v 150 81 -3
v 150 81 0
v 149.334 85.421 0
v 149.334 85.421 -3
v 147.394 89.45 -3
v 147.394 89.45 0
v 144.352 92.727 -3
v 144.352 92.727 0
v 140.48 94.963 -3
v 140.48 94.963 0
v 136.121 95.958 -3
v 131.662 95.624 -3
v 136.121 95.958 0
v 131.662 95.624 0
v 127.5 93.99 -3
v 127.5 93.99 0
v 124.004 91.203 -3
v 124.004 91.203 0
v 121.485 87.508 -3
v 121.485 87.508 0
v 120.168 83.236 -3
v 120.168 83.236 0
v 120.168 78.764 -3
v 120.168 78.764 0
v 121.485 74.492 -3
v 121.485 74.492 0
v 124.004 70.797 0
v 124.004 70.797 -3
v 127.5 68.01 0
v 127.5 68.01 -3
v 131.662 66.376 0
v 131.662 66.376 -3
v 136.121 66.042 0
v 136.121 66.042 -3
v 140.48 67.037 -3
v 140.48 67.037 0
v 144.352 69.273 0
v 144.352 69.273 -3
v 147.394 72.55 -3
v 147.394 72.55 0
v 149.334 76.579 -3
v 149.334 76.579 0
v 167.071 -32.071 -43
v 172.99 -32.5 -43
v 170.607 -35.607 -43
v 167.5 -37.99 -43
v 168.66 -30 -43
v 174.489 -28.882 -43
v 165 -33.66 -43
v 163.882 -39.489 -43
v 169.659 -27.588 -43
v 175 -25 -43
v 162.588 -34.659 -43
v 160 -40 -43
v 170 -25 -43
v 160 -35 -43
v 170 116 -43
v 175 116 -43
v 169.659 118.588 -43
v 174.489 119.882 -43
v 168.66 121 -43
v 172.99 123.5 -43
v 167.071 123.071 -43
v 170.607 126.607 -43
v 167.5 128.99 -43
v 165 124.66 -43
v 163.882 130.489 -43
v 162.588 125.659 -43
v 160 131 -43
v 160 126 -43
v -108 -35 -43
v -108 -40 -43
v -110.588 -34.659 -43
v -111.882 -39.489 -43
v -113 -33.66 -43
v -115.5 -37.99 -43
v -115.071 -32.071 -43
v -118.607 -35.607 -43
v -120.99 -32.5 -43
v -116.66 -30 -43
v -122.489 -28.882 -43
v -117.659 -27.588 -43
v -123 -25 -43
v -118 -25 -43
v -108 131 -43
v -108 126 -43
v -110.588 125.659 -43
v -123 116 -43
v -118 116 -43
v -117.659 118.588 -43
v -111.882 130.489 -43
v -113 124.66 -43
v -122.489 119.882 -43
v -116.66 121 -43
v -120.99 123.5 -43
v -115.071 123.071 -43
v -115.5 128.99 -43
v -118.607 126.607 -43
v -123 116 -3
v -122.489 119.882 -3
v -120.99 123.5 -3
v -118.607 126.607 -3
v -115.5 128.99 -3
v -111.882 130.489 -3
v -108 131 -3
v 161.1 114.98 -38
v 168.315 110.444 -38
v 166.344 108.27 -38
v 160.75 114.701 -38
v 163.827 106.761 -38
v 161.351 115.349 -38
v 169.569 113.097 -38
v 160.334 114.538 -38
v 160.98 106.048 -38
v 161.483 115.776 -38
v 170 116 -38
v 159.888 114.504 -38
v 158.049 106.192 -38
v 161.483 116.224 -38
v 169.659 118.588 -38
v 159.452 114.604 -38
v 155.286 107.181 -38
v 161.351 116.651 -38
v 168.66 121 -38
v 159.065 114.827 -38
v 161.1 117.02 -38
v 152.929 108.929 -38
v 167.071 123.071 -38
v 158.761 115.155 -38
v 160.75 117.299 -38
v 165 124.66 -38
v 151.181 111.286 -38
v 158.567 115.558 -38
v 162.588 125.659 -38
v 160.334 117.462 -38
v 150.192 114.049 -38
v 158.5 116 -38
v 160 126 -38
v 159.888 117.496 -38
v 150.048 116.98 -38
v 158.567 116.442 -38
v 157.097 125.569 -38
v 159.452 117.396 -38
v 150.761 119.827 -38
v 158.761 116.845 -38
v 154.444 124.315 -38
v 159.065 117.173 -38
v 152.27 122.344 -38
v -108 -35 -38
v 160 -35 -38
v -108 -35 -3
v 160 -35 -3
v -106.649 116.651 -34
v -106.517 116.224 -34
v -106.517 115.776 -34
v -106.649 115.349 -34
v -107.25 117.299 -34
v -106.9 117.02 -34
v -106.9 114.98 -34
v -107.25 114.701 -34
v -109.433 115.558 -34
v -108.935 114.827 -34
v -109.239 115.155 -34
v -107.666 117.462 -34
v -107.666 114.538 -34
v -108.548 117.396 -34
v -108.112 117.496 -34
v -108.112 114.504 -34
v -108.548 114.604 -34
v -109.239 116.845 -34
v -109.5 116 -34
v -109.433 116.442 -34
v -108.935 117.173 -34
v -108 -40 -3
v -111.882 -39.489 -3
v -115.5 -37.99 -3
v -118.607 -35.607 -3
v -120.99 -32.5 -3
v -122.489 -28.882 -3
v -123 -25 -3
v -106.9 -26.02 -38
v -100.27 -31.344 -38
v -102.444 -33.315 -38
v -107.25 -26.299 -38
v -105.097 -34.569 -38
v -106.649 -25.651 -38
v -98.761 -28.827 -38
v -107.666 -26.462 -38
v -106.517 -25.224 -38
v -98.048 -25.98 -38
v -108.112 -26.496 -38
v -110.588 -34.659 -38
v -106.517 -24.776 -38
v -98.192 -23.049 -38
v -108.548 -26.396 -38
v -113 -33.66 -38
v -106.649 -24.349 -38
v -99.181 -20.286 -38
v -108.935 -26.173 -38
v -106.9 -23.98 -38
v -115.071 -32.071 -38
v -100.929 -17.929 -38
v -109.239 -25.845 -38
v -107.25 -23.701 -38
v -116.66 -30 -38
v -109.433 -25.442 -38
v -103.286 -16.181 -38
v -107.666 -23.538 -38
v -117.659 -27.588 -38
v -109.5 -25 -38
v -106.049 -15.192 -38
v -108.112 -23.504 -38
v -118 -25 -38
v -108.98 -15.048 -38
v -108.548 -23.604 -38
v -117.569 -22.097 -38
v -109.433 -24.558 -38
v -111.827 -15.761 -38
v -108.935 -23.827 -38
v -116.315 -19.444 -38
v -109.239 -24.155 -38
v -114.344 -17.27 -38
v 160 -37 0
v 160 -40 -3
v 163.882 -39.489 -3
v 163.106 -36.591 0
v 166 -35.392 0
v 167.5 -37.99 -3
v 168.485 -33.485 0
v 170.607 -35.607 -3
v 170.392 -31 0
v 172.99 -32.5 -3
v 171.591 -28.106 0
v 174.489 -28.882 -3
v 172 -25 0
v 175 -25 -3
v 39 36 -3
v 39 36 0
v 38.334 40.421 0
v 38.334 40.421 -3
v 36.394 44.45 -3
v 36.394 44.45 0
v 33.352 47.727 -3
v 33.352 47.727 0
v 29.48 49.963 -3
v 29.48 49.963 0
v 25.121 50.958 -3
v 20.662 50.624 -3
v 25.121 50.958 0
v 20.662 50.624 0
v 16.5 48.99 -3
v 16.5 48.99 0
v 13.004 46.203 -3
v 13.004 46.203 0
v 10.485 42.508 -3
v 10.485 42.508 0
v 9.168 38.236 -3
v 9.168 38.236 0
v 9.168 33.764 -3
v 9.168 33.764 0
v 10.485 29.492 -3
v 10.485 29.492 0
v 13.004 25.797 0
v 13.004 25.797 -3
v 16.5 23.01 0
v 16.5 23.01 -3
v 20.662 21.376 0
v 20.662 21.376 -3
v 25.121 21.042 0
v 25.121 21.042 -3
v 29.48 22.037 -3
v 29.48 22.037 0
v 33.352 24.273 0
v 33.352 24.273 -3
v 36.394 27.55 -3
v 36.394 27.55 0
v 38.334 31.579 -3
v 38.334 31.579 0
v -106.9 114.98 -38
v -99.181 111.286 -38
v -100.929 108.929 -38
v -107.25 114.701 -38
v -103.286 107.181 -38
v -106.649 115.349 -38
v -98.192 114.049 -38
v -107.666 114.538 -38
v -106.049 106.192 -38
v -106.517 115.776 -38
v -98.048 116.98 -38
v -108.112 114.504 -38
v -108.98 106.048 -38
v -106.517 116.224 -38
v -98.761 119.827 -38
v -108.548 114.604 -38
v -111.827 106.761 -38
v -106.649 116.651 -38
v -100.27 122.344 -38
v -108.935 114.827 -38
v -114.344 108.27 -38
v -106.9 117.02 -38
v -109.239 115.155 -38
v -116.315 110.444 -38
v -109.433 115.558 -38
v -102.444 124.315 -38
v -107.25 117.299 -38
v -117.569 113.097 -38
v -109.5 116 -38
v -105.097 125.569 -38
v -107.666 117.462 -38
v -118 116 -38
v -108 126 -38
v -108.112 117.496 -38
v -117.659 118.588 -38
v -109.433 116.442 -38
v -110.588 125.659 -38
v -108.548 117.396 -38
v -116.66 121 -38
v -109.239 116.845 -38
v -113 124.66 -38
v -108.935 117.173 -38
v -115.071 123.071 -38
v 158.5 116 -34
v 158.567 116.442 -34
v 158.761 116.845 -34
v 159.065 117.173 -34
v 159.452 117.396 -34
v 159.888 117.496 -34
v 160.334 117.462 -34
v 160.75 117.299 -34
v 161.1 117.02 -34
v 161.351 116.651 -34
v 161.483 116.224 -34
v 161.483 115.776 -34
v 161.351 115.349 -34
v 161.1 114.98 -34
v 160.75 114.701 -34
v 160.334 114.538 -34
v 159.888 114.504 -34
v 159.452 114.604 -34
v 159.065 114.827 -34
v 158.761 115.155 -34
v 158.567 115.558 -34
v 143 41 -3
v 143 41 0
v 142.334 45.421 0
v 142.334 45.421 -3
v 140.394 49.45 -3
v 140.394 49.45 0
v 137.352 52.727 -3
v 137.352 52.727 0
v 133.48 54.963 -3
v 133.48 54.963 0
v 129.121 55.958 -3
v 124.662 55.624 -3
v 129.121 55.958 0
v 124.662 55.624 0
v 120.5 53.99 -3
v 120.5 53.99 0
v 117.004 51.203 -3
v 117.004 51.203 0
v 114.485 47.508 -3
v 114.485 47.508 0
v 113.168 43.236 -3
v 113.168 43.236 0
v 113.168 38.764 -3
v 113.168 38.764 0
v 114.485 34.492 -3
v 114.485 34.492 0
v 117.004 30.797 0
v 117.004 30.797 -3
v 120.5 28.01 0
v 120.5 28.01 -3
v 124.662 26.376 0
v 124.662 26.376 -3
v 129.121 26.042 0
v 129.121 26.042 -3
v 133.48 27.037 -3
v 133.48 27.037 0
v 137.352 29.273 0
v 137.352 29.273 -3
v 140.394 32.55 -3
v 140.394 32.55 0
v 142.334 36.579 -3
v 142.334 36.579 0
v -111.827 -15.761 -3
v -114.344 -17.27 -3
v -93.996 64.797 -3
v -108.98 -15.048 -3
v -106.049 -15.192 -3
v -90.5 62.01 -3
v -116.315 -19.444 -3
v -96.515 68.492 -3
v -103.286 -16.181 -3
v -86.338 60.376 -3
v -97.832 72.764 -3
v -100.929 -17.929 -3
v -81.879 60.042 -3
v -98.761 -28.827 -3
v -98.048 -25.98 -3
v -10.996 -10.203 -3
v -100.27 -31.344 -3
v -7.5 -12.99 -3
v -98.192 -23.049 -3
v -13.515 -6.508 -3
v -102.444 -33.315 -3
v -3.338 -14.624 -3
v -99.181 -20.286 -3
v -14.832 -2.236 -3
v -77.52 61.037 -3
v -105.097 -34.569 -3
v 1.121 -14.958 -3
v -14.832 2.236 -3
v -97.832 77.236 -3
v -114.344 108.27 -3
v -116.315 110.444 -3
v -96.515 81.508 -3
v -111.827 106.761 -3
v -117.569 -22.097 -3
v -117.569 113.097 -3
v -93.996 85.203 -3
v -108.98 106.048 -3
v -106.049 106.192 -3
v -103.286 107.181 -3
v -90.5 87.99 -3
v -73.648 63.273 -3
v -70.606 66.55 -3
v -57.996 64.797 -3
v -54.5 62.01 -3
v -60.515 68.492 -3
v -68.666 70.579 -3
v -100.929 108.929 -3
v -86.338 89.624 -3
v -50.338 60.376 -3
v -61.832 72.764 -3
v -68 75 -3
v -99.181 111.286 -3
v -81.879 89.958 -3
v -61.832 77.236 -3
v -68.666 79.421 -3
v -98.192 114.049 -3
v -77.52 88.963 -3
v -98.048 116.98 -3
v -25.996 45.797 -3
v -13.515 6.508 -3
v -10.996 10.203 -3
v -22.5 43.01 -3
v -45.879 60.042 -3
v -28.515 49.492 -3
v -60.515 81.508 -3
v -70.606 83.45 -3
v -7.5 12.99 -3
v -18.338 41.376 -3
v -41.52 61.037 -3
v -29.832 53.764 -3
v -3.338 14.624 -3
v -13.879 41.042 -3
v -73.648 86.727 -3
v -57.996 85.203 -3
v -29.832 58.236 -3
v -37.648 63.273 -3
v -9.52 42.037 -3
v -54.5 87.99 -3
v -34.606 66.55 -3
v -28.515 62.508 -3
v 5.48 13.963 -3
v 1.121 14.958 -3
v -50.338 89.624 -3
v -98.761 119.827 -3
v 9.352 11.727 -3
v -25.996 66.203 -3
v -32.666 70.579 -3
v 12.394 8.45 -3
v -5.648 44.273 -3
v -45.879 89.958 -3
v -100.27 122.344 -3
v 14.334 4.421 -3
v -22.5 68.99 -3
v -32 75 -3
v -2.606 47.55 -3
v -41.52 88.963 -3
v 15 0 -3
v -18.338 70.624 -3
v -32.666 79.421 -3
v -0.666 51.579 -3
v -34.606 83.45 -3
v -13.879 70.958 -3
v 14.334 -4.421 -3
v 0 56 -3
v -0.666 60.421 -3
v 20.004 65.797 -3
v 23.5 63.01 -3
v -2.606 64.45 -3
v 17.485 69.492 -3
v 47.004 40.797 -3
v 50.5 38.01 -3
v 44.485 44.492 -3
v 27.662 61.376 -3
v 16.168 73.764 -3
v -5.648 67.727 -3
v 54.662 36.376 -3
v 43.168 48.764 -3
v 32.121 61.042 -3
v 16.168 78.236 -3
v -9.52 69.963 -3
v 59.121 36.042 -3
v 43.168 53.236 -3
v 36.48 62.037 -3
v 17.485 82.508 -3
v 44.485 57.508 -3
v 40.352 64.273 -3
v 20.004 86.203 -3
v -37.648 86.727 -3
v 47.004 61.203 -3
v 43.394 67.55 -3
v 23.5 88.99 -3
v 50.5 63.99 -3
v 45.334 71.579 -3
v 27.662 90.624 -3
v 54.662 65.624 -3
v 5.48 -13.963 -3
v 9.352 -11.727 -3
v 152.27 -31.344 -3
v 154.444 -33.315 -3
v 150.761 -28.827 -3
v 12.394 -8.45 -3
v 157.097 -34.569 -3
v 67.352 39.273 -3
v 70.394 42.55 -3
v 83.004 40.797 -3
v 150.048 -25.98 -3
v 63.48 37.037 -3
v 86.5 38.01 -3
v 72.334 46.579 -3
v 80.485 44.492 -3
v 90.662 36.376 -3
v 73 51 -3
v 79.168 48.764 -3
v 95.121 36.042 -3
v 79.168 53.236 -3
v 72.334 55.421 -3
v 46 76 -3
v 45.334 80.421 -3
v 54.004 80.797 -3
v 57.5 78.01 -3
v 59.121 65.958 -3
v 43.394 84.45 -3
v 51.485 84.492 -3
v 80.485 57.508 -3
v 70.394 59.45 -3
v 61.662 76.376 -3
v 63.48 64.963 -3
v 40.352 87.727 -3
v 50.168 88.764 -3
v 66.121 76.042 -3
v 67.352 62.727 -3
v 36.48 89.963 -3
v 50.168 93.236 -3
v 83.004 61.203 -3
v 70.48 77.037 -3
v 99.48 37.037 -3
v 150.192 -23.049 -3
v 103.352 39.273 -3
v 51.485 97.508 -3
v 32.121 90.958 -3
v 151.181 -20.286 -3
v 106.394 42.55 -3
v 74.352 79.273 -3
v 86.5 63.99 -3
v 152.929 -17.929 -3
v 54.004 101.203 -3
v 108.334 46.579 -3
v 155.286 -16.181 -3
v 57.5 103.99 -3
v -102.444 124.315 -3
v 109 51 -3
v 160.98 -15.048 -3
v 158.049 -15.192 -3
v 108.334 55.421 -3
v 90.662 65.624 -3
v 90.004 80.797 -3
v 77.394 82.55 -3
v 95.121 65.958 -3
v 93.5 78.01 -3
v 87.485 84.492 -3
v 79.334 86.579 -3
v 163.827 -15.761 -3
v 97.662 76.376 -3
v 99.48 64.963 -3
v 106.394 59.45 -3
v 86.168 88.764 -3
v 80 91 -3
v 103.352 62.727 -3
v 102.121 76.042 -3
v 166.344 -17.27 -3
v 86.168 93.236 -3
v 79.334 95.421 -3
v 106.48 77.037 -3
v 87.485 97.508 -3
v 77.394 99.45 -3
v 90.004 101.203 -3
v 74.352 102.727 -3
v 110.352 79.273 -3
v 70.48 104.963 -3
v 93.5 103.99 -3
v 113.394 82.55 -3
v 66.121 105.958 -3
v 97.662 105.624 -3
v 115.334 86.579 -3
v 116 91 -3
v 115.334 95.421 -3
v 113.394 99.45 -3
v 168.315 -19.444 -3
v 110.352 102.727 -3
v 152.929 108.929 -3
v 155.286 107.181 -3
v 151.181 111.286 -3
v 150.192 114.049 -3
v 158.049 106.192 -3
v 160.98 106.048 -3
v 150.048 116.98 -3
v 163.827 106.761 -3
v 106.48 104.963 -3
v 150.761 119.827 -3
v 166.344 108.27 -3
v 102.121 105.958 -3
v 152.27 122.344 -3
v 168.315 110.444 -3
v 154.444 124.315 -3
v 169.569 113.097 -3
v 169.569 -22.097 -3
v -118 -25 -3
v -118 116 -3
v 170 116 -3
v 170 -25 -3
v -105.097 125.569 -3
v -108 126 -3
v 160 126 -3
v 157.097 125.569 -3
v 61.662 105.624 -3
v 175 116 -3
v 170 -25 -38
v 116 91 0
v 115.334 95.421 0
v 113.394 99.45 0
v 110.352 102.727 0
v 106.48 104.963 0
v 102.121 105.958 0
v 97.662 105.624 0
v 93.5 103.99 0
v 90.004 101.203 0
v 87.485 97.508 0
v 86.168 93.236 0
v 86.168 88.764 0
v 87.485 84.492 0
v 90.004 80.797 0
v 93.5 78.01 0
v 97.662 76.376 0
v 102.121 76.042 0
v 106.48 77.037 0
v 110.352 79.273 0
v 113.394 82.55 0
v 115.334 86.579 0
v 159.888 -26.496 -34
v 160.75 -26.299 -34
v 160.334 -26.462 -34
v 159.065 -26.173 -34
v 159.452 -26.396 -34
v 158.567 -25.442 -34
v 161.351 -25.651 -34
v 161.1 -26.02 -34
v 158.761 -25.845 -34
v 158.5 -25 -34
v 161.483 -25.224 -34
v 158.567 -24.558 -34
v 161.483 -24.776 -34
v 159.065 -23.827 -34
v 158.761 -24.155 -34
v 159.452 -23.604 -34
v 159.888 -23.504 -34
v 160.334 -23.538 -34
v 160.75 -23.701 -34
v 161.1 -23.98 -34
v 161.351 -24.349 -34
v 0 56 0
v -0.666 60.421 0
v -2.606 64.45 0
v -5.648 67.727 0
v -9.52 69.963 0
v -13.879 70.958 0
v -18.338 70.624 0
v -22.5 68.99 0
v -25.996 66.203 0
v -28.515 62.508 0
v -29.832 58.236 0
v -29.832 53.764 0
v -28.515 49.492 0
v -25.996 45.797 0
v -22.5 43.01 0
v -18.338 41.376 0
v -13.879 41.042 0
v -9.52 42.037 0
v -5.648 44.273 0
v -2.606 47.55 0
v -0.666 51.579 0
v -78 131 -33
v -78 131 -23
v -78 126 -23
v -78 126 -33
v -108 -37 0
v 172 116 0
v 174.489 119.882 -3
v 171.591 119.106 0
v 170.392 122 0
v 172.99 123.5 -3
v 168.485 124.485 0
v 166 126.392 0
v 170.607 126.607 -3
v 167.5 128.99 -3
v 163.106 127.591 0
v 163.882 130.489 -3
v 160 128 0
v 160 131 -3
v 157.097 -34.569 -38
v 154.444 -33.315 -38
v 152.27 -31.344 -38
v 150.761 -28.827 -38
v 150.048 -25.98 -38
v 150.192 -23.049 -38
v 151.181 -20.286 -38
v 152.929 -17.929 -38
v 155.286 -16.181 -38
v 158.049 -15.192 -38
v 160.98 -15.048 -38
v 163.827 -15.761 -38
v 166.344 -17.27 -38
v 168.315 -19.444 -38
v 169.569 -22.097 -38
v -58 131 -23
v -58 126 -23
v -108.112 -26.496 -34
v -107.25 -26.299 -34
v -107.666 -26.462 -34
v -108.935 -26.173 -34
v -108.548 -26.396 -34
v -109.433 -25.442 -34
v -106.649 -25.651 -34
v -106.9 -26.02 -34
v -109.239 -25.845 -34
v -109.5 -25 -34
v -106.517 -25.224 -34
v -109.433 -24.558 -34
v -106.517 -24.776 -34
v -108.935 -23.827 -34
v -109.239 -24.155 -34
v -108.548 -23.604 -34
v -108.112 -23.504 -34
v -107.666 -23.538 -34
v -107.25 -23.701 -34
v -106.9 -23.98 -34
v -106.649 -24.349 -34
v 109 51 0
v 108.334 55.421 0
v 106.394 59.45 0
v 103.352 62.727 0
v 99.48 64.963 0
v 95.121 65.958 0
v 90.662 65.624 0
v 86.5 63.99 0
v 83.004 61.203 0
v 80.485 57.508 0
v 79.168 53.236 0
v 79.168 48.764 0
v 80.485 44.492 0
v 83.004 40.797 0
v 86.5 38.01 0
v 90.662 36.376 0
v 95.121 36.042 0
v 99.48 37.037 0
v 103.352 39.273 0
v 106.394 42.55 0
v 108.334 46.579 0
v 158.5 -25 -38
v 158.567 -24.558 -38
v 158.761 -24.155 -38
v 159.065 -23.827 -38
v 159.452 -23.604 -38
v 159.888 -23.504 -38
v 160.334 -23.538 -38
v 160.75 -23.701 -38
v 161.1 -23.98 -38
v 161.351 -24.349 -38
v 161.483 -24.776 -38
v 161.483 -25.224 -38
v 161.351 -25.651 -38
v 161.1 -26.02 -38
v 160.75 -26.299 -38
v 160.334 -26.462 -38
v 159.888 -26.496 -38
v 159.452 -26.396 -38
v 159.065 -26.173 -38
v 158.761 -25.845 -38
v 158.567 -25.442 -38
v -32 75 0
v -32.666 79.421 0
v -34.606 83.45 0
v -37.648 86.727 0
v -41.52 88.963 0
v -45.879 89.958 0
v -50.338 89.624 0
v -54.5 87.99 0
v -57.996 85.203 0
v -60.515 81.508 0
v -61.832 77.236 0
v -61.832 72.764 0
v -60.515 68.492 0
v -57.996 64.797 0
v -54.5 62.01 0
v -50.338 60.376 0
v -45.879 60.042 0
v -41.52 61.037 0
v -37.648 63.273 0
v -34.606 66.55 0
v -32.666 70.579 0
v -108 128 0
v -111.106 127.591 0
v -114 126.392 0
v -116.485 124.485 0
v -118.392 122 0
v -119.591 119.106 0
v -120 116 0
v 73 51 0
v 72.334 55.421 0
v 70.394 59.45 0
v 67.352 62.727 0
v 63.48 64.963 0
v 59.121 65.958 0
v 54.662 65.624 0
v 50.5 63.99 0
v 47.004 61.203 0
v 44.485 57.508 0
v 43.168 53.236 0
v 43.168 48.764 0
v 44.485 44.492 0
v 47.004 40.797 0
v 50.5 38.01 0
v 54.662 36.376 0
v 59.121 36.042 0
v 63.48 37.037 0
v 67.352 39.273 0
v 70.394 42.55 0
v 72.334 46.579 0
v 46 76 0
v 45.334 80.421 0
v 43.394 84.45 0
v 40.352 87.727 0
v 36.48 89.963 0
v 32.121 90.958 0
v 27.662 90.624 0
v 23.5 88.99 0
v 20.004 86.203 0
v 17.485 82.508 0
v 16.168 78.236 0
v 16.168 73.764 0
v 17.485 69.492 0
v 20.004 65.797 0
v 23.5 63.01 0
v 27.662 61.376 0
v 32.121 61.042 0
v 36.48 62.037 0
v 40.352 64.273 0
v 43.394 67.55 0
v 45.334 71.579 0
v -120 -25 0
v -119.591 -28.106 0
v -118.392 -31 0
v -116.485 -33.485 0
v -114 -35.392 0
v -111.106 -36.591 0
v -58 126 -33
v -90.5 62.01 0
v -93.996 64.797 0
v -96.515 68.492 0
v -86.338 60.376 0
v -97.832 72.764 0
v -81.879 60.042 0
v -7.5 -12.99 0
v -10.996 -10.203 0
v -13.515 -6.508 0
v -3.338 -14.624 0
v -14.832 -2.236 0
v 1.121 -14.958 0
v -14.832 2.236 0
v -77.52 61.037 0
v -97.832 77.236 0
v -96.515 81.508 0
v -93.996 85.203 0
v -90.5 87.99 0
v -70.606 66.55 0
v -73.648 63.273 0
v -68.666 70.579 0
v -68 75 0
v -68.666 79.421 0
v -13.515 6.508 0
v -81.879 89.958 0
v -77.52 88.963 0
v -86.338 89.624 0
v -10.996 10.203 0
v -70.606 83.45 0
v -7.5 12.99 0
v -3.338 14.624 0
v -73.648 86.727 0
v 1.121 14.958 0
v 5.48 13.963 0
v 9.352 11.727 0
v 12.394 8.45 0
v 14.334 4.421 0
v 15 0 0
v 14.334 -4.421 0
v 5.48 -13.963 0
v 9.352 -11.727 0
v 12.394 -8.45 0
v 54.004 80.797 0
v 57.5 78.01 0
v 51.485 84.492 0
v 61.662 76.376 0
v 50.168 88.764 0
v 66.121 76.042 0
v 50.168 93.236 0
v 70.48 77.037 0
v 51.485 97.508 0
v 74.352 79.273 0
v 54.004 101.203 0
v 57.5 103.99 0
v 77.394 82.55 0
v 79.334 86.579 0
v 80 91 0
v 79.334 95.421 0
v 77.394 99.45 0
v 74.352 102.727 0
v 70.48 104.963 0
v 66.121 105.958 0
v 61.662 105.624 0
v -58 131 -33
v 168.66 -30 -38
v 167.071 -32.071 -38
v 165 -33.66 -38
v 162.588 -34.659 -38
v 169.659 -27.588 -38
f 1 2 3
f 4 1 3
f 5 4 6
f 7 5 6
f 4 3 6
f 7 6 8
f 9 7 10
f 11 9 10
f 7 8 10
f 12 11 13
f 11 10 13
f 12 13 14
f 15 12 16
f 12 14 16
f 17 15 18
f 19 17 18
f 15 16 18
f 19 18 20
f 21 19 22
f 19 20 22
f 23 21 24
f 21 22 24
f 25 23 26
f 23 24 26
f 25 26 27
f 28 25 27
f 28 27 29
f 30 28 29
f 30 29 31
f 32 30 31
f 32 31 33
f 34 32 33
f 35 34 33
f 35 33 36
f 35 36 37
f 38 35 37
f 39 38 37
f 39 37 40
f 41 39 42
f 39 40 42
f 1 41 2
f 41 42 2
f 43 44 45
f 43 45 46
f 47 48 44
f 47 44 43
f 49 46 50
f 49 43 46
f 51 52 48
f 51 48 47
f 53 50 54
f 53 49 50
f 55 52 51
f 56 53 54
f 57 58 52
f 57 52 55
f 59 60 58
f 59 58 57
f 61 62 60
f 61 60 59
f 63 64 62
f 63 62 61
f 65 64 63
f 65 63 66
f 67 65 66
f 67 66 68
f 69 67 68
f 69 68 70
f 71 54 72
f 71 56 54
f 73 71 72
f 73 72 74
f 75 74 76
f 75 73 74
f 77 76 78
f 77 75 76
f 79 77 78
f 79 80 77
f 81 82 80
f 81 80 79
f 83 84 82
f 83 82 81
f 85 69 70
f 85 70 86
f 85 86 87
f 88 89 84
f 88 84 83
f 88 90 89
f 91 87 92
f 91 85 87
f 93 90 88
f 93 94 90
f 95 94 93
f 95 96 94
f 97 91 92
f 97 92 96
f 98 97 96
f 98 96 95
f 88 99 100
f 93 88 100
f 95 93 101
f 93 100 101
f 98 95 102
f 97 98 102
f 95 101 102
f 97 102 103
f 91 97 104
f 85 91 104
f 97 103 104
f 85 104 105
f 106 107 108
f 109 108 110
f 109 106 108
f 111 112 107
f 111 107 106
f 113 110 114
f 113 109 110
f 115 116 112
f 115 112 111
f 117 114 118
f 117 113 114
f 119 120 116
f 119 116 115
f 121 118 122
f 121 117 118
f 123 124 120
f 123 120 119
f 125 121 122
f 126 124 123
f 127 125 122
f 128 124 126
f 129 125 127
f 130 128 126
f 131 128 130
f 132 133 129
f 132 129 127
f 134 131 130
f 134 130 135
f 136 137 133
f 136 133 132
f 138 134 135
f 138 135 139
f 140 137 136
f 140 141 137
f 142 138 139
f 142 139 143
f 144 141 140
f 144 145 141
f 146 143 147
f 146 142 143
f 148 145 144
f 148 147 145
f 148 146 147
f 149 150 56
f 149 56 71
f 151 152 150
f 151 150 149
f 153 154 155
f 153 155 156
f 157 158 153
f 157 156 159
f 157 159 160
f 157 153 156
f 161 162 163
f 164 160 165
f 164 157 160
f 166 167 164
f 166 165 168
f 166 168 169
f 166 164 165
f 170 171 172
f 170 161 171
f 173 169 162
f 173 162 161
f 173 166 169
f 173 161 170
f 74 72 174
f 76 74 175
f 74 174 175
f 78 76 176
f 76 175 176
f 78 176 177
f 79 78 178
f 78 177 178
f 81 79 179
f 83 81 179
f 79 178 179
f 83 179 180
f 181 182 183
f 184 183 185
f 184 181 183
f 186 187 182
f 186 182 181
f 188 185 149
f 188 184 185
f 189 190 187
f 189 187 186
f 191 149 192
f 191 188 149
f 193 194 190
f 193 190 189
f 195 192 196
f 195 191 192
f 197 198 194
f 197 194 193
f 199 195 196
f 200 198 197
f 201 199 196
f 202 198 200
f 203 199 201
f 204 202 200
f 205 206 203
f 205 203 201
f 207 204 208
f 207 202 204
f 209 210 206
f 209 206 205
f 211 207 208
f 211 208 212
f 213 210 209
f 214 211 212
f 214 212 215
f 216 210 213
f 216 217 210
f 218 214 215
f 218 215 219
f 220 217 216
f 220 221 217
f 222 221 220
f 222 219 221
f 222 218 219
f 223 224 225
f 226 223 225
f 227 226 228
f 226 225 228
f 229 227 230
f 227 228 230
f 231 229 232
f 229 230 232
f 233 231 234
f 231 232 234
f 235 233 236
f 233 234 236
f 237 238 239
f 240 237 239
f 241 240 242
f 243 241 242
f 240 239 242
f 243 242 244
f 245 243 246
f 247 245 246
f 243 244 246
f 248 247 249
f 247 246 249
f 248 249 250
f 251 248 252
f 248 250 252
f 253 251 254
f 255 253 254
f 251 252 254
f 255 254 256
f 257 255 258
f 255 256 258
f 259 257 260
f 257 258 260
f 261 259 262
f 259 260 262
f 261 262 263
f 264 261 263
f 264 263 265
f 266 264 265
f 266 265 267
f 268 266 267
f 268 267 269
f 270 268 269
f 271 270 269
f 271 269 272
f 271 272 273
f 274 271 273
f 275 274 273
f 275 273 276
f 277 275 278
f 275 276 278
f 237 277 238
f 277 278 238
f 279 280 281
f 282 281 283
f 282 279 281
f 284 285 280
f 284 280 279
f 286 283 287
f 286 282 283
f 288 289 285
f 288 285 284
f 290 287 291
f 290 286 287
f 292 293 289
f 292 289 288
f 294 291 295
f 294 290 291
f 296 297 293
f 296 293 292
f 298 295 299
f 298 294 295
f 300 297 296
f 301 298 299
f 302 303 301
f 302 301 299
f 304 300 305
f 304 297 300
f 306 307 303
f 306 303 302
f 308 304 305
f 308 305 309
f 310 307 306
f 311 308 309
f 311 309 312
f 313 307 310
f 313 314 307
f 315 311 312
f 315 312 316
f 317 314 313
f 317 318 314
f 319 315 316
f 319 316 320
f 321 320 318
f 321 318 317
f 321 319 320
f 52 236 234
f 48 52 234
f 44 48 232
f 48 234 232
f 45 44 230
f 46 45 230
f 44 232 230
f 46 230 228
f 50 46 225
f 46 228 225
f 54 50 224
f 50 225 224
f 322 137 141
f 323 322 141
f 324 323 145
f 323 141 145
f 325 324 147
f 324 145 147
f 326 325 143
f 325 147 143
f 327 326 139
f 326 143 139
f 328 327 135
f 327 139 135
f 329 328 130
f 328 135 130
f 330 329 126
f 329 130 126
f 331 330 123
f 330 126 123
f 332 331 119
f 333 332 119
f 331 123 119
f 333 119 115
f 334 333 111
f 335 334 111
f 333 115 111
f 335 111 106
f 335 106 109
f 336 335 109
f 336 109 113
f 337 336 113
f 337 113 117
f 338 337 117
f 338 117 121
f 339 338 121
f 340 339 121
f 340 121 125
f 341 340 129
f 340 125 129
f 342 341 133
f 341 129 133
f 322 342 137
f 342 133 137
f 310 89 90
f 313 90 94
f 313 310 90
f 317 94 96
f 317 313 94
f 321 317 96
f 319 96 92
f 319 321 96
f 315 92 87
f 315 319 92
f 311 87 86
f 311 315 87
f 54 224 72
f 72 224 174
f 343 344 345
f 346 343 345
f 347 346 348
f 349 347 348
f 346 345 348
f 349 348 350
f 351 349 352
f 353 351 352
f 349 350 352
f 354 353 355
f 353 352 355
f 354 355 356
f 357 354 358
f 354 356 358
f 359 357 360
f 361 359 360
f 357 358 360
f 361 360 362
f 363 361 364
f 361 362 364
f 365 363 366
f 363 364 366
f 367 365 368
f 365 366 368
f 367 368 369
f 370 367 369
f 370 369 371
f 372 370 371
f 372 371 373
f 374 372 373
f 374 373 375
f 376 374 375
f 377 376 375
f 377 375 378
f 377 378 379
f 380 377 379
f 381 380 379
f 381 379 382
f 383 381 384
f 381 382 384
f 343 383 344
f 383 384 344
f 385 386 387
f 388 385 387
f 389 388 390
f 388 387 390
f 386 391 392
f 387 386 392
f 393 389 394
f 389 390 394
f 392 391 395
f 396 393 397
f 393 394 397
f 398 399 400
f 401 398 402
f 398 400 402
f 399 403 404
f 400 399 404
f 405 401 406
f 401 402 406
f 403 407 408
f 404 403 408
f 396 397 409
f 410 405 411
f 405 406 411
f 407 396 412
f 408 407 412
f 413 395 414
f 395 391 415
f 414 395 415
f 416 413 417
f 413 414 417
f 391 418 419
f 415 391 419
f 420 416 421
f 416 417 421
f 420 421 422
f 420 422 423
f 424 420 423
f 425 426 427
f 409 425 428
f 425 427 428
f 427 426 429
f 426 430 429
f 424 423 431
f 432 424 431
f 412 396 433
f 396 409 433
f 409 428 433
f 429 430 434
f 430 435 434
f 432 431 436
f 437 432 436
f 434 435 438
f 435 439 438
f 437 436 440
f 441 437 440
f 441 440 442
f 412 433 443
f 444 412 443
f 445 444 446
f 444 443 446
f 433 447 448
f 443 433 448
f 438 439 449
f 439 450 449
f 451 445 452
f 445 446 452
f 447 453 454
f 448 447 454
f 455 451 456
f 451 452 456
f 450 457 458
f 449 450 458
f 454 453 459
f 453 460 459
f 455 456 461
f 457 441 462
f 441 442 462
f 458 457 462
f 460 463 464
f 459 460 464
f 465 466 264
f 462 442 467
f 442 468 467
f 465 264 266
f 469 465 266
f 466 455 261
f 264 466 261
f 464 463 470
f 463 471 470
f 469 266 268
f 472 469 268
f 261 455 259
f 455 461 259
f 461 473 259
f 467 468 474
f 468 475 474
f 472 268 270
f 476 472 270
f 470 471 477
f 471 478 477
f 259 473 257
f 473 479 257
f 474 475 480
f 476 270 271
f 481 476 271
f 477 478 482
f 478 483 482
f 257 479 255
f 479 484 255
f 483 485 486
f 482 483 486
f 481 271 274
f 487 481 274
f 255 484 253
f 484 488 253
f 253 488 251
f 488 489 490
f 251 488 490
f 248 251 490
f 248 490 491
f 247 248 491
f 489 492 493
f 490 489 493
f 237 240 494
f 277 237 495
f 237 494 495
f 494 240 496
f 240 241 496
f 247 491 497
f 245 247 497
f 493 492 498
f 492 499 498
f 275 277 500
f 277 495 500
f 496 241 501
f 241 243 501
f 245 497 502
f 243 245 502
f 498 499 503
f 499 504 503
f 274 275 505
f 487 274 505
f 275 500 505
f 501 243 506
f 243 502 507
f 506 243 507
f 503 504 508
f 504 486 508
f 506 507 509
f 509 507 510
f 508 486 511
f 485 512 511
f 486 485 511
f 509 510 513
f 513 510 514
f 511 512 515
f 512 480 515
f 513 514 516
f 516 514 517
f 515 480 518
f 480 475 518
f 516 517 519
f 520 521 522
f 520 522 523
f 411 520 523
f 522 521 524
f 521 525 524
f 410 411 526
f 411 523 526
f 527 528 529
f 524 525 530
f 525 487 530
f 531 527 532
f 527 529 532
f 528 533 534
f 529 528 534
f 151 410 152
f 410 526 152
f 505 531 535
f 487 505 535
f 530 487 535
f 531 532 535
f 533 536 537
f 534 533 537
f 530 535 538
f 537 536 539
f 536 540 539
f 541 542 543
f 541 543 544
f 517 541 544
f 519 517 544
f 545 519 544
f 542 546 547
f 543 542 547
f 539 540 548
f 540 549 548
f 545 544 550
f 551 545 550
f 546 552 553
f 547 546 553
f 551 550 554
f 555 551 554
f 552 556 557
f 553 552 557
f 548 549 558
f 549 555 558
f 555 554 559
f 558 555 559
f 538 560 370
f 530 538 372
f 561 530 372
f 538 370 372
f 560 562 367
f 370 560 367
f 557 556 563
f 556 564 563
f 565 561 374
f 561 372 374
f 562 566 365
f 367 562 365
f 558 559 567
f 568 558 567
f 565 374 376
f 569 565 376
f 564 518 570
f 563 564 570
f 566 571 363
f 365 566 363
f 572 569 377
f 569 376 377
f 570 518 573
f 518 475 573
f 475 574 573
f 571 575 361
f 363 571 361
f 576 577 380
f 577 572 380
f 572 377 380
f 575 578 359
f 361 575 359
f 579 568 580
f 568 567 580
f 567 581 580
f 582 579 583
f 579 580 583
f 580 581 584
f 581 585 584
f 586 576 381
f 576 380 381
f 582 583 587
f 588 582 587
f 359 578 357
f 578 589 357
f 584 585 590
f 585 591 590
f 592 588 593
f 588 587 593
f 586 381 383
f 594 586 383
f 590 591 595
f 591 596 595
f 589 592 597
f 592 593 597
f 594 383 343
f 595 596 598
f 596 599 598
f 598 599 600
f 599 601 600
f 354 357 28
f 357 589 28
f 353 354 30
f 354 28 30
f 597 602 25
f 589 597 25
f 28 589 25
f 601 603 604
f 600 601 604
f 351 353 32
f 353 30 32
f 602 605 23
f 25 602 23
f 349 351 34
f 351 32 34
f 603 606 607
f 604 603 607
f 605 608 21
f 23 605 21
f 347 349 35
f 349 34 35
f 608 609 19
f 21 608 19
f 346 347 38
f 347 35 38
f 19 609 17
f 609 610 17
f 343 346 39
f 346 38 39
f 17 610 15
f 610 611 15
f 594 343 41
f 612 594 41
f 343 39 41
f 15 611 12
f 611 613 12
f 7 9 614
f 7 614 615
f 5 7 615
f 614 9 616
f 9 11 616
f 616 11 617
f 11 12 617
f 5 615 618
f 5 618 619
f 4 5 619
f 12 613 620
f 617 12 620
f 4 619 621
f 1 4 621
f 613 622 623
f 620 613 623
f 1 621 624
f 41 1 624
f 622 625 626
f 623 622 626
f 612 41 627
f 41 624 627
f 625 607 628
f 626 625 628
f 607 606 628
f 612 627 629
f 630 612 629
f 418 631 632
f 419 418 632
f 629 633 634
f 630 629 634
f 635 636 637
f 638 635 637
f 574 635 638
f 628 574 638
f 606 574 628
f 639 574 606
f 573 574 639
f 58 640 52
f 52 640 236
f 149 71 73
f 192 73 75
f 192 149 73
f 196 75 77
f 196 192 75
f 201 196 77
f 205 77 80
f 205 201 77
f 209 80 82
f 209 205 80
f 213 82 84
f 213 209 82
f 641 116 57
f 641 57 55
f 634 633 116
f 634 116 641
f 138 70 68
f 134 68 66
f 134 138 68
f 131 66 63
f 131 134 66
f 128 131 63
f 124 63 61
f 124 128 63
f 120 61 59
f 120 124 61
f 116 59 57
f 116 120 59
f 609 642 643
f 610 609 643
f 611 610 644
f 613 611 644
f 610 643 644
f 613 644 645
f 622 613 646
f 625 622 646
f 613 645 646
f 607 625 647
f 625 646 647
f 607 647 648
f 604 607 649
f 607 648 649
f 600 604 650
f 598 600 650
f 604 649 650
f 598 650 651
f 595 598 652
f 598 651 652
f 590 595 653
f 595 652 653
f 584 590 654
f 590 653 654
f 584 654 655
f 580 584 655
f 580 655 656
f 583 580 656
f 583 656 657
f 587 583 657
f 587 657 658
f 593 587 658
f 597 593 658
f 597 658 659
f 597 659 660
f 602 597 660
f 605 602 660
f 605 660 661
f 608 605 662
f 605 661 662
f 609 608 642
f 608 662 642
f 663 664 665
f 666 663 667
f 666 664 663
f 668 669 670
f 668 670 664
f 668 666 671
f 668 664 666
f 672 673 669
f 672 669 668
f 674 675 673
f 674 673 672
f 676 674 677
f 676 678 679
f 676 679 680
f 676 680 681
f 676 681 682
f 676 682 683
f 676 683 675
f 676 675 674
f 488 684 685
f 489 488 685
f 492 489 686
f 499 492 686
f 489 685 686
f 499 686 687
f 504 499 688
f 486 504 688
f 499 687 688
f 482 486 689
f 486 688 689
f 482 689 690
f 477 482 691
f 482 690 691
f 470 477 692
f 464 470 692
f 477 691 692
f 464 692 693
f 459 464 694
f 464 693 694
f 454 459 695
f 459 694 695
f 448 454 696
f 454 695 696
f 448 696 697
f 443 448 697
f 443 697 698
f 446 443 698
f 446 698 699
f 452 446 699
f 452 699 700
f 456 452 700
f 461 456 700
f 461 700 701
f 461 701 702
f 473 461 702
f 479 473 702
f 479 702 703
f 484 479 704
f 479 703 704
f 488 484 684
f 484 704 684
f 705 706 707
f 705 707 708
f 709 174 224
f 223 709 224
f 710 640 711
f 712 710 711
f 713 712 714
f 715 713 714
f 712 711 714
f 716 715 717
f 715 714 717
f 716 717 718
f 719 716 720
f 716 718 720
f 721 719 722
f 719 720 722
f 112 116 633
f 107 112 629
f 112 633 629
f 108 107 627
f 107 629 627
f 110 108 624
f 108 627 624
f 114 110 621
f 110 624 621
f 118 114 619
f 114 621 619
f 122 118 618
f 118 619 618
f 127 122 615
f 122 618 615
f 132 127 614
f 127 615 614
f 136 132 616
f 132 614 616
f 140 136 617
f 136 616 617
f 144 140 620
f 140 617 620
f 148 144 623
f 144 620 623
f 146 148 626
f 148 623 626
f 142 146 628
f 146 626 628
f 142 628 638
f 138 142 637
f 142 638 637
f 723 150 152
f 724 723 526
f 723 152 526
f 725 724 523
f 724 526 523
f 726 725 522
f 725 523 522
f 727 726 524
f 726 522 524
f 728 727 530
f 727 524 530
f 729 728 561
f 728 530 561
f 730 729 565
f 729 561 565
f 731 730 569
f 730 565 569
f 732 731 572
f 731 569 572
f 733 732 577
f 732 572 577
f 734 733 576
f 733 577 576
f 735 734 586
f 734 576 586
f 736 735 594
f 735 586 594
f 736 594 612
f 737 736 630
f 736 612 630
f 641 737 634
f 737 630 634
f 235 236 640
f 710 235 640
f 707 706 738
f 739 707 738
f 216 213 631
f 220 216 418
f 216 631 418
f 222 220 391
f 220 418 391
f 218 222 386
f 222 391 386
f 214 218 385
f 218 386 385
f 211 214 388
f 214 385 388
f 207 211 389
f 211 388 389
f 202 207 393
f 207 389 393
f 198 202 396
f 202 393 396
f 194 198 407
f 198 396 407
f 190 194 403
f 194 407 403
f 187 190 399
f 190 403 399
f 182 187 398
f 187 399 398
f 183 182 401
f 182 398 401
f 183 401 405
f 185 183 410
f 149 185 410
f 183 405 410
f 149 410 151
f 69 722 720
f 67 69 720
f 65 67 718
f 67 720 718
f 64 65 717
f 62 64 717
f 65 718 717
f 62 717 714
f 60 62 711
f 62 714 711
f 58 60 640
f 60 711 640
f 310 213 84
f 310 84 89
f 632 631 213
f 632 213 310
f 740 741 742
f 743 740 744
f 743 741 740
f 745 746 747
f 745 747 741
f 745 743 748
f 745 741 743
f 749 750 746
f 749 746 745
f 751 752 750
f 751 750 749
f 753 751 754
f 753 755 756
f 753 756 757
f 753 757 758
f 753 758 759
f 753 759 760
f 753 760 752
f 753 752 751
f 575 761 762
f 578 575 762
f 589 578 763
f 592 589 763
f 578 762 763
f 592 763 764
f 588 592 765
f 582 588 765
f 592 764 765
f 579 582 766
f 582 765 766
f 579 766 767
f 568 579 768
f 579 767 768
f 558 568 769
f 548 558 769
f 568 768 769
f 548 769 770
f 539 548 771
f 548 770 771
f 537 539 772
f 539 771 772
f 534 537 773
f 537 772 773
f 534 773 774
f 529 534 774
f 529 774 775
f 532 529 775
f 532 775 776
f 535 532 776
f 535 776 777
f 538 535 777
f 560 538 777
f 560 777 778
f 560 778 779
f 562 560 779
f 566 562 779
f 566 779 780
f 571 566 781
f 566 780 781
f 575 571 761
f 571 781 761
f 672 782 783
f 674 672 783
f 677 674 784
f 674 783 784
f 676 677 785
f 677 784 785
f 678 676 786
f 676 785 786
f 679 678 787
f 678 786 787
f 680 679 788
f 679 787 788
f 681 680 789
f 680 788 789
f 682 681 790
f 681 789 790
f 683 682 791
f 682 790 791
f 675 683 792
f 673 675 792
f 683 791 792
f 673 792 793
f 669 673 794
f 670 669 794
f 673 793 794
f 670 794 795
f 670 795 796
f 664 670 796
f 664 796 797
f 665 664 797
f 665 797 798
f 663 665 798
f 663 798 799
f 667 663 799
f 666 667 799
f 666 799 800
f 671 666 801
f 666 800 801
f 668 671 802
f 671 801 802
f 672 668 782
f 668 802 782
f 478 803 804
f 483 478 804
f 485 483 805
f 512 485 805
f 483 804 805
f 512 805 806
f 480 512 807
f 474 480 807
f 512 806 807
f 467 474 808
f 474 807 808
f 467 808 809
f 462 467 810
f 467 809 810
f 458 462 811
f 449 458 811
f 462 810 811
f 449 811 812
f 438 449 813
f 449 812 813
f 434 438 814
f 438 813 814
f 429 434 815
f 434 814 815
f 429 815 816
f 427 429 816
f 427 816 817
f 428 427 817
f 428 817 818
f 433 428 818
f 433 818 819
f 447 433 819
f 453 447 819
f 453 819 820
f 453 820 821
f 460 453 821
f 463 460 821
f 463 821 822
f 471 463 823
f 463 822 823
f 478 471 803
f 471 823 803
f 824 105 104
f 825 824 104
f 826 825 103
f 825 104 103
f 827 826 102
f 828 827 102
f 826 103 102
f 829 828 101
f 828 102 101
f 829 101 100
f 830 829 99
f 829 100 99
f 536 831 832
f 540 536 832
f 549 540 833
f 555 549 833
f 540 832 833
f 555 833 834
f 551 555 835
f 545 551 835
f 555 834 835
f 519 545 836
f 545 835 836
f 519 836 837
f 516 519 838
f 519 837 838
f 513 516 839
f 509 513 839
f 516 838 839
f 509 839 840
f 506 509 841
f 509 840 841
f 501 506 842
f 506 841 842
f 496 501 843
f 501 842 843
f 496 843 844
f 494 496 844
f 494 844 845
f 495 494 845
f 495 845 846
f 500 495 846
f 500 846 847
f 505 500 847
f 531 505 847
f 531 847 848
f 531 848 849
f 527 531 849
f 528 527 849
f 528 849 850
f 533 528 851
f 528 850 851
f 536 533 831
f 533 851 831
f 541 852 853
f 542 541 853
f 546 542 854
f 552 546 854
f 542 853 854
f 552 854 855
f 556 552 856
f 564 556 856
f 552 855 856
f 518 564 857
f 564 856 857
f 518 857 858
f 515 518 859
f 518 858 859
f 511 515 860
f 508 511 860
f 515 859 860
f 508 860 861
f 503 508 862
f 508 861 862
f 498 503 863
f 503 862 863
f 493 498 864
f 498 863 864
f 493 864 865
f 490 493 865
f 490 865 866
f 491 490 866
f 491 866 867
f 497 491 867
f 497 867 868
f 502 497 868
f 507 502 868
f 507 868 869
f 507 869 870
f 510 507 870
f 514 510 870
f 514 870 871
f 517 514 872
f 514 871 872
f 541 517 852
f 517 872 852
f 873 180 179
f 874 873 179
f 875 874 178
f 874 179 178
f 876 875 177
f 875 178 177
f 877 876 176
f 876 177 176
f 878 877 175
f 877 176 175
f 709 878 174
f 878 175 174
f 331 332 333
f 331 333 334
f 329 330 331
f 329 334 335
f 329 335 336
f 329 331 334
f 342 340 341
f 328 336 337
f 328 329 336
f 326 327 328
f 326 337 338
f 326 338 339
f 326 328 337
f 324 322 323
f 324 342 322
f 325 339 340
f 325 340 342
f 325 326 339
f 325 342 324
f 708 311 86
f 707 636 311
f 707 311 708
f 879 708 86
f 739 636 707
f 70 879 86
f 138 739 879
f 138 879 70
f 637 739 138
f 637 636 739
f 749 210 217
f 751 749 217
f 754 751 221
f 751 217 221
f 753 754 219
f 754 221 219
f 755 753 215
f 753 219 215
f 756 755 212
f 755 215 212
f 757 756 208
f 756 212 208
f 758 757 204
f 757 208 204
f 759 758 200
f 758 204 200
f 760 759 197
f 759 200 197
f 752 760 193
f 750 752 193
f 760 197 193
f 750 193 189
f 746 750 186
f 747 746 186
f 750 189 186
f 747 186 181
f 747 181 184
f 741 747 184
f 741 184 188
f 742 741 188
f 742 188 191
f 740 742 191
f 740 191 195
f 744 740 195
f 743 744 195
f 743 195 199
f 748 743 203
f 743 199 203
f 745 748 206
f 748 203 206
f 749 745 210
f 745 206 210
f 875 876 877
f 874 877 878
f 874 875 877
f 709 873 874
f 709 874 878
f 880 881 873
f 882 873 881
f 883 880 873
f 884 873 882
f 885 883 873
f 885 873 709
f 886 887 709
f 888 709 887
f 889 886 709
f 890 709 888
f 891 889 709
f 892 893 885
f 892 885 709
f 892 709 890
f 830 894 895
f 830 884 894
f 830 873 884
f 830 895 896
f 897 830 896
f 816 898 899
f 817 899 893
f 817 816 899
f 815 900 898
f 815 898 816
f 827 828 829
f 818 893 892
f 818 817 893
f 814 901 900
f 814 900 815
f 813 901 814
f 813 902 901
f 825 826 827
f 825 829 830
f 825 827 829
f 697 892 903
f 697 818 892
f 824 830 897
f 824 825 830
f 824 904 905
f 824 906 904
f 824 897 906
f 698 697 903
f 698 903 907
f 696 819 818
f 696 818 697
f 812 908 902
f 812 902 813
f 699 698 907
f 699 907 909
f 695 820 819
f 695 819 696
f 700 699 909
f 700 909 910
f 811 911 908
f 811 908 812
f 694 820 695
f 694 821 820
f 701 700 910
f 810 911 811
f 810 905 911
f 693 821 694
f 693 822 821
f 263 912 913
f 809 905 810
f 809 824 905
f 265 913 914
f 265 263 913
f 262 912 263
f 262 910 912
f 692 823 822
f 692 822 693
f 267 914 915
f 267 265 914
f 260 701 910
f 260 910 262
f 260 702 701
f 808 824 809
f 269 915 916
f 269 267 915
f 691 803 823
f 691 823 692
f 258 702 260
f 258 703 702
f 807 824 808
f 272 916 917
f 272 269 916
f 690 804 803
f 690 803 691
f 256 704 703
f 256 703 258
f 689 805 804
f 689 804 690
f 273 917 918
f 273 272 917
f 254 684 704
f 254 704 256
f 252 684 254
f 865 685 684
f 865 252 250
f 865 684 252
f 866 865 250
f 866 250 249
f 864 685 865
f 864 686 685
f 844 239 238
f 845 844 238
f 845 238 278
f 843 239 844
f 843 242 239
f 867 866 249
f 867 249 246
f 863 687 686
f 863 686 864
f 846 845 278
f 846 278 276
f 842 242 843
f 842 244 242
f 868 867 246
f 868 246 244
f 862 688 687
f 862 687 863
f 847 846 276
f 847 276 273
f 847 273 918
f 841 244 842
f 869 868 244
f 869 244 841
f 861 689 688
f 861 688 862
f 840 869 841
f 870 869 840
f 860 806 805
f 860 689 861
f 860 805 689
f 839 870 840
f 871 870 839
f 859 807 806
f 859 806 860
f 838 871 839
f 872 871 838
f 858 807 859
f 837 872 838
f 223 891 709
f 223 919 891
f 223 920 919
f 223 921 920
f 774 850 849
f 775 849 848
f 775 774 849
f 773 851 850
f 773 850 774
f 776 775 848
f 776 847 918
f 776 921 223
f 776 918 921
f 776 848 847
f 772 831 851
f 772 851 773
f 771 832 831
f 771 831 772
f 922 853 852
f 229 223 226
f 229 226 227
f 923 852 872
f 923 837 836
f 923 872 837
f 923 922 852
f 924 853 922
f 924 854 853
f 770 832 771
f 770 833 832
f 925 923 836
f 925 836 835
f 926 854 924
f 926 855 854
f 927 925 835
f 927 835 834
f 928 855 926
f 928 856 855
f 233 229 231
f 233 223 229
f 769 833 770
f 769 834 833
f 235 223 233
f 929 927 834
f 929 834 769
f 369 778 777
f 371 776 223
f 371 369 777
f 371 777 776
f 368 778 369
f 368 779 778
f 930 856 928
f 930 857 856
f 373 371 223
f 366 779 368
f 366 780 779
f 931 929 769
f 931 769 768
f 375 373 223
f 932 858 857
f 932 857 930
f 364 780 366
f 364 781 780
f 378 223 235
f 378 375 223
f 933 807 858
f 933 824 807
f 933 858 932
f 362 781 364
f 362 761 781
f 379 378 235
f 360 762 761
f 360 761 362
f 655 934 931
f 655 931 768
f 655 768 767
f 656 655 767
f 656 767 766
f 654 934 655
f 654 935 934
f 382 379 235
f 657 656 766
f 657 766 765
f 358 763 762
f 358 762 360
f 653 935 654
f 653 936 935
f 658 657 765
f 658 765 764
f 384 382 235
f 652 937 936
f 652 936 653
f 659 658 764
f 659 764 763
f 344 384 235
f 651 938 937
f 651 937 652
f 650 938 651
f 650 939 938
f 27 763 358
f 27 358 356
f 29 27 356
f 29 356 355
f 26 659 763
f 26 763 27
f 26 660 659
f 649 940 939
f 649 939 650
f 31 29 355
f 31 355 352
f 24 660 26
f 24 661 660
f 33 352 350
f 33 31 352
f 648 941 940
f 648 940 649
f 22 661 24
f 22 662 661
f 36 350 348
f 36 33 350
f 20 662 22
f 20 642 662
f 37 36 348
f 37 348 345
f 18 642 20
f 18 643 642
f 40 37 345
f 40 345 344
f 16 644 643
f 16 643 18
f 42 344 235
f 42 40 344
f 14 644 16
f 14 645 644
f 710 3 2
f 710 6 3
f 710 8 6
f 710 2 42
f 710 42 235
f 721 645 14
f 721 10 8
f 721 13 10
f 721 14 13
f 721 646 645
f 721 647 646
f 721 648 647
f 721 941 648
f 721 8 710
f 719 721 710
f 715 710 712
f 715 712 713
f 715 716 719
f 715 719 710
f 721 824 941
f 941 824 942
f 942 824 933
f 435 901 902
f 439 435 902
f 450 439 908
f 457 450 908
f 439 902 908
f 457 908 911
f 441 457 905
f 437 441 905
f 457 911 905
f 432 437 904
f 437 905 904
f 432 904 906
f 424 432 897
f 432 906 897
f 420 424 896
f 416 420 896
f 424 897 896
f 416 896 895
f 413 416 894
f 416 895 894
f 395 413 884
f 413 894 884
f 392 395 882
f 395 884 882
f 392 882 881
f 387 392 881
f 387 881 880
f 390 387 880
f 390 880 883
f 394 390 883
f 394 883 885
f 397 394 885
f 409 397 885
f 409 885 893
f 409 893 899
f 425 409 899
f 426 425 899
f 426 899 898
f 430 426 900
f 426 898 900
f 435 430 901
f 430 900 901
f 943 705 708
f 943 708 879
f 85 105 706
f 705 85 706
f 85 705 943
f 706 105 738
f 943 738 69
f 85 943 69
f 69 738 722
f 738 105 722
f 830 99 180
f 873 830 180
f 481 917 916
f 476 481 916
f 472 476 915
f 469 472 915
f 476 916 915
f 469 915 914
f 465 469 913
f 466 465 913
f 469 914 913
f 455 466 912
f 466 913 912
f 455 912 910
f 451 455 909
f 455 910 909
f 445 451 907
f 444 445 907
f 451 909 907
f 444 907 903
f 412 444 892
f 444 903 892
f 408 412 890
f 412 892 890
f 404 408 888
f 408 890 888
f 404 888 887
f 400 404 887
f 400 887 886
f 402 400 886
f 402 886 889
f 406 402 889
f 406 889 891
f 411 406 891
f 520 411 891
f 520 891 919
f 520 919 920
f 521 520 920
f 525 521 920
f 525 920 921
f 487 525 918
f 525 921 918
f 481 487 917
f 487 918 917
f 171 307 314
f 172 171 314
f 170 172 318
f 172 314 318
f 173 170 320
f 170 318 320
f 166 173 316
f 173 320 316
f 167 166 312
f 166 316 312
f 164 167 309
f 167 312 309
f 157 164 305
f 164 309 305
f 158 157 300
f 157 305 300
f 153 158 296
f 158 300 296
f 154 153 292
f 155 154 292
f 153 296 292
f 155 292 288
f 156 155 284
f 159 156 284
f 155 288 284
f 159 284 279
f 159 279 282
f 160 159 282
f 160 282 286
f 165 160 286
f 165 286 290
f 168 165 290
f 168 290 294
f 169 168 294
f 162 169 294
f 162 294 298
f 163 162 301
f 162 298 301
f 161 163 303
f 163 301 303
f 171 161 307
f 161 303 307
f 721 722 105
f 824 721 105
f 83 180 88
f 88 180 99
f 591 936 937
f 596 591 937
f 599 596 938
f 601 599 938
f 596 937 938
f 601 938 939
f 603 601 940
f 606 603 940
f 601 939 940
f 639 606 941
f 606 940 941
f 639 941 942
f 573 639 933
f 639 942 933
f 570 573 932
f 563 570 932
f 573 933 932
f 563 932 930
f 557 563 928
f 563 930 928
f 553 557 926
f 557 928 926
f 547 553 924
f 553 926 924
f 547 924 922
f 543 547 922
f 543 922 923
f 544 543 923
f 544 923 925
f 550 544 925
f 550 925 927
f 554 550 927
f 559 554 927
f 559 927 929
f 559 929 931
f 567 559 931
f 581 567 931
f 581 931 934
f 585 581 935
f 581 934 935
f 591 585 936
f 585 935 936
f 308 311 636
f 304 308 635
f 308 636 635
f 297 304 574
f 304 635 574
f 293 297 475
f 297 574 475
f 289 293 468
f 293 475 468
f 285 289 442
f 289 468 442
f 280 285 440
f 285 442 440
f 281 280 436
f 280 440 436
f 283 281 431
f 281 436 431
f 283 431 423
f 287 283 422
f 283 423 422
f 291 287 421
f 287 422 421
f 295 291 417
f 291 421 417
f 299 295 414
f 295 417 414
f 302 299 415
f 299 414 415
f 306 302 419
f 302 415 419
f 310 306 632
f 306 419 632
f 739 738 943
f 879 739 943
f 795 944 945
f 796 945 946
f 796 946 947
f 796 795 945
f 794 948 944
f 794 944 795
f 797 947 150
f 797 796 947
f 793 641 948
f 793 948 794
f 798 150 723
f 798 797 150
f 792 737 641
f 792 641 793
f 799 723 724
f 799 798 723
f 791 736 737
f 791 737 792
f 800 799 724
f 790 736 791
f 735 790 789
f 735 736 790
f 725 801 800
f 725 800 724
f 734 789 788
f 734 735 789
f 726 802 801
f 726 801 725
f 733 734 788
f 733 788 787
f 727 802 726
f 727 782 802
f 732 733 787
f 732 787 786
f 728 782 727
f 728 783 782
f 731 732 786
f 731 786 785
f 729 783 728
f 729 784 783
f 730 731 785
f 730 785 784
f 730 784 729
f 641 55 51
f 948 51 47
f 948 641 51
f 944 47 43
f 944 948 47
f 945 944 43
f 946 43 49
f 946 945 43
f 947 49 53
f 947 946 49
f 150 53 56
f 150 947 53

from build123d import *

# Parameters (mm, degrees)
SKETCH1_R           = 15
BOSS_EXTRUDE1_DEPTH = 3
BOSS_EXTRUDE2_DEPTH = 40
CHAMFER1_SIZE       = 3
SKETCH4_R           = 10
BOSS_EXTRUDE3_DEPTH = 35
SKETCH6_W           = 20
SKETCH6_H           = 10
CUT_EXTRUDE1_DEPTH  = 5
SKETCH8_R           = 1.5
CUT_EXTRUDE3_DEPTH  = 4


with BuildPart() as part:
    # Sketch1 → Boss-Extrude1 (new body)
    with BuildSketch(Plane.XY):
        with BuildLine():
            Line((-123, 116), (-123, -25))
            ThreePointArc((-123, -25), (-118.606601718, -35.606601718), (-108, -40))
            Line((-108, -40), (160, -40))
            ThreePointArc((160, -40), (170.606601718, -35.606601718), (175, -25))
            Line((175, -25), (175, 116))
            ThreePointArc((175, 116), (170.606601718, 126.606601718), (160, 131))
            Line((160, 131), (-108, 131))
            ThreePointArc((-108, 131), (-118.606601718, 126.606601718), (-123, 116))
        make_face()
        Circle(SKETCH1_R, mode=Mode.SUBTRACT)
        with Locations((-47, 75)):
            Circle(SKETCH1_R, mode=Mode.SUBTRACT)
        with Locations((-15, 56)):
            Circle(SKETCH1_R, mode=Mode.SUBTRACT)
        with Locations((-83, 75)):
            Circle(SKETCH1_R, mode=Mode.SUBTRACT)
        with Locations((31, 76)):
            Circle(SKETCH1_R, mode=Mode.SUBTRACT)
        with Locations((65, 91)):
            Circle(SKETCH1_R, mode=Mode.SUBTRACT)
        with Locations((101, 91)):
            Circle(SKETCH1_R, mode=Mode.SUBTRACT)
        with Locations((24, 36)):
            Circle(SKETCH1_R, mode=Mode.SUBTRACT)
        with Locations((58, 51)):
            Circle(SKETCH1_R, mode=Mode.SUBTRACT)
        with Locations((94, 51)):
            Circle(SKETCH1_R, mode=Mode.SUBTRACT)
        with Locations((135, 81)):
            Circle(SKETCH1_R, mode=Mode.SUBTRACT)
        with Locations((128, 41)):
            Circle(SKETCH1_R, mode=Mode.SUBTRACT)
    extrude(amount=-BOSS_EXTRUDE1_DEPTH)

    # Sketch2 → Boss-Extrude2 (add)
    with BuildSketch(Plane(origin=(0, 0, -3), x_dir=(-1, 0, 0), z_dir=(0, 0, -1))):
        with BuildLine():
            Line((123, -25), (123, 116))
            ThreePointArc((123, 116), (118.606601718, 126.606601718), (108, 131))
            Line((108, 131), (-160, 131))
            ThreePointArc((-160, 131), (-170.606601718, 126.606601718), (-175, 116))
            Line((-175, 116), (-175, -25))
            ThreePointArc((-175, -25), (-170.606601718, -35.606601718), (-160, -40))
            Line((-160, -40), (108, -40))
            ThreePointArc((108, -40), (118.606601718, -35.606601718), (123, -25))
        make_face()
        with BuildLine():
            Line((118, -25), (118, 116))
            ThreePointArc((118, 116), (115.071067812, 123.071067812), (108, 126))
            Line((108, 126), (-160, 126))
            ThreePointArc((-160, 126), (-167.071067812, 123.071067812), (-170, 116))
            Line((-170, 116), (-170, -25))
            ThreePointArc((-170, -25), (-167.071067812, -32.071067812), (-160, -35))
            Line((-160, -35), (108, -35))
            ThreePointArc((108, -35), (115.071067812, -32.071067812), (118, -25))
        make_face(mode=Mode.SUBTRACT)
    extrude(amount=BOSS_EXTRUDE2_DEPTH)

    # Chamfer1
    chamfer1_edges = [part.edges().sort_by_distance(p)[0] for p in [
        (26, 131, 0),
        (170.606601718, 126.606601718, 0),
        (175, 45.5, 0),
        (170.606601718, -35.606601718, 0),
        (26, -40, 0),
        (-118.606601718, -35.606601718, 0),
        (-123, 45.5, 0),
        (-118.606601718, 126.606601718, 0),
    ]]
    chamfer(chamfer1_edges, length=CHAMFER1_SIZE)

    # Sketch4 → Boss-Extrude3 (add)
    with BuildSketch(Plane(origin=(0, 0, -3), x_dir=(-1, 0, 0), z_dir=(0, 0, -1))):
        with Locations((-160, 116)):
            Circle(SKETCH4_R)
        with Locations((108, 116)):
            Circle(SKETCH4_R)
        with Locations((-160, -25)):
            Circle(SKETCH4_R)
        with Locations((108, -25)):
            Circle(SKETCH4_R)
    extrude(amount=BOSS_EXTRUDE3_DEPTH)

    # Sketch6 → Cut-Extrude1 (cut)
    with BuildSketch(Plane(origin=(0, 131, 0), x_dir=(1, 0, 0), z_dir=(0, 1, 0))):
        with Locations((-68, 28)):
            Rectangle(SKETCH6_W, SKETCH6_H)
    extrude(amount=-CUT_EXTRUDE1_DEPTH, mode=Mode.SUBTRACT)

    # Sketch8 → Cut-Extrude3 (cut)
    with BuildSketch(Plane(origin=(0, 0, -38), x_dir=(-1, 0, 0), z_dir=(0, 0, -1))):
        with Locations((-160, 116)):
            Circle(SKETCH8_R)
        with Locations((108, 116)):
            Circle(SKETCH8_R)
        with Locations((-160, -25)):
            Circle(SKETCH8_R)
        with Locations((108, -25)):
            Circle(SKETCH8_R)
    extrude(amount=-CUT_EXTRUDE3_DEPTH, mode=Mode.SUBTRACT)


solid = part.part
